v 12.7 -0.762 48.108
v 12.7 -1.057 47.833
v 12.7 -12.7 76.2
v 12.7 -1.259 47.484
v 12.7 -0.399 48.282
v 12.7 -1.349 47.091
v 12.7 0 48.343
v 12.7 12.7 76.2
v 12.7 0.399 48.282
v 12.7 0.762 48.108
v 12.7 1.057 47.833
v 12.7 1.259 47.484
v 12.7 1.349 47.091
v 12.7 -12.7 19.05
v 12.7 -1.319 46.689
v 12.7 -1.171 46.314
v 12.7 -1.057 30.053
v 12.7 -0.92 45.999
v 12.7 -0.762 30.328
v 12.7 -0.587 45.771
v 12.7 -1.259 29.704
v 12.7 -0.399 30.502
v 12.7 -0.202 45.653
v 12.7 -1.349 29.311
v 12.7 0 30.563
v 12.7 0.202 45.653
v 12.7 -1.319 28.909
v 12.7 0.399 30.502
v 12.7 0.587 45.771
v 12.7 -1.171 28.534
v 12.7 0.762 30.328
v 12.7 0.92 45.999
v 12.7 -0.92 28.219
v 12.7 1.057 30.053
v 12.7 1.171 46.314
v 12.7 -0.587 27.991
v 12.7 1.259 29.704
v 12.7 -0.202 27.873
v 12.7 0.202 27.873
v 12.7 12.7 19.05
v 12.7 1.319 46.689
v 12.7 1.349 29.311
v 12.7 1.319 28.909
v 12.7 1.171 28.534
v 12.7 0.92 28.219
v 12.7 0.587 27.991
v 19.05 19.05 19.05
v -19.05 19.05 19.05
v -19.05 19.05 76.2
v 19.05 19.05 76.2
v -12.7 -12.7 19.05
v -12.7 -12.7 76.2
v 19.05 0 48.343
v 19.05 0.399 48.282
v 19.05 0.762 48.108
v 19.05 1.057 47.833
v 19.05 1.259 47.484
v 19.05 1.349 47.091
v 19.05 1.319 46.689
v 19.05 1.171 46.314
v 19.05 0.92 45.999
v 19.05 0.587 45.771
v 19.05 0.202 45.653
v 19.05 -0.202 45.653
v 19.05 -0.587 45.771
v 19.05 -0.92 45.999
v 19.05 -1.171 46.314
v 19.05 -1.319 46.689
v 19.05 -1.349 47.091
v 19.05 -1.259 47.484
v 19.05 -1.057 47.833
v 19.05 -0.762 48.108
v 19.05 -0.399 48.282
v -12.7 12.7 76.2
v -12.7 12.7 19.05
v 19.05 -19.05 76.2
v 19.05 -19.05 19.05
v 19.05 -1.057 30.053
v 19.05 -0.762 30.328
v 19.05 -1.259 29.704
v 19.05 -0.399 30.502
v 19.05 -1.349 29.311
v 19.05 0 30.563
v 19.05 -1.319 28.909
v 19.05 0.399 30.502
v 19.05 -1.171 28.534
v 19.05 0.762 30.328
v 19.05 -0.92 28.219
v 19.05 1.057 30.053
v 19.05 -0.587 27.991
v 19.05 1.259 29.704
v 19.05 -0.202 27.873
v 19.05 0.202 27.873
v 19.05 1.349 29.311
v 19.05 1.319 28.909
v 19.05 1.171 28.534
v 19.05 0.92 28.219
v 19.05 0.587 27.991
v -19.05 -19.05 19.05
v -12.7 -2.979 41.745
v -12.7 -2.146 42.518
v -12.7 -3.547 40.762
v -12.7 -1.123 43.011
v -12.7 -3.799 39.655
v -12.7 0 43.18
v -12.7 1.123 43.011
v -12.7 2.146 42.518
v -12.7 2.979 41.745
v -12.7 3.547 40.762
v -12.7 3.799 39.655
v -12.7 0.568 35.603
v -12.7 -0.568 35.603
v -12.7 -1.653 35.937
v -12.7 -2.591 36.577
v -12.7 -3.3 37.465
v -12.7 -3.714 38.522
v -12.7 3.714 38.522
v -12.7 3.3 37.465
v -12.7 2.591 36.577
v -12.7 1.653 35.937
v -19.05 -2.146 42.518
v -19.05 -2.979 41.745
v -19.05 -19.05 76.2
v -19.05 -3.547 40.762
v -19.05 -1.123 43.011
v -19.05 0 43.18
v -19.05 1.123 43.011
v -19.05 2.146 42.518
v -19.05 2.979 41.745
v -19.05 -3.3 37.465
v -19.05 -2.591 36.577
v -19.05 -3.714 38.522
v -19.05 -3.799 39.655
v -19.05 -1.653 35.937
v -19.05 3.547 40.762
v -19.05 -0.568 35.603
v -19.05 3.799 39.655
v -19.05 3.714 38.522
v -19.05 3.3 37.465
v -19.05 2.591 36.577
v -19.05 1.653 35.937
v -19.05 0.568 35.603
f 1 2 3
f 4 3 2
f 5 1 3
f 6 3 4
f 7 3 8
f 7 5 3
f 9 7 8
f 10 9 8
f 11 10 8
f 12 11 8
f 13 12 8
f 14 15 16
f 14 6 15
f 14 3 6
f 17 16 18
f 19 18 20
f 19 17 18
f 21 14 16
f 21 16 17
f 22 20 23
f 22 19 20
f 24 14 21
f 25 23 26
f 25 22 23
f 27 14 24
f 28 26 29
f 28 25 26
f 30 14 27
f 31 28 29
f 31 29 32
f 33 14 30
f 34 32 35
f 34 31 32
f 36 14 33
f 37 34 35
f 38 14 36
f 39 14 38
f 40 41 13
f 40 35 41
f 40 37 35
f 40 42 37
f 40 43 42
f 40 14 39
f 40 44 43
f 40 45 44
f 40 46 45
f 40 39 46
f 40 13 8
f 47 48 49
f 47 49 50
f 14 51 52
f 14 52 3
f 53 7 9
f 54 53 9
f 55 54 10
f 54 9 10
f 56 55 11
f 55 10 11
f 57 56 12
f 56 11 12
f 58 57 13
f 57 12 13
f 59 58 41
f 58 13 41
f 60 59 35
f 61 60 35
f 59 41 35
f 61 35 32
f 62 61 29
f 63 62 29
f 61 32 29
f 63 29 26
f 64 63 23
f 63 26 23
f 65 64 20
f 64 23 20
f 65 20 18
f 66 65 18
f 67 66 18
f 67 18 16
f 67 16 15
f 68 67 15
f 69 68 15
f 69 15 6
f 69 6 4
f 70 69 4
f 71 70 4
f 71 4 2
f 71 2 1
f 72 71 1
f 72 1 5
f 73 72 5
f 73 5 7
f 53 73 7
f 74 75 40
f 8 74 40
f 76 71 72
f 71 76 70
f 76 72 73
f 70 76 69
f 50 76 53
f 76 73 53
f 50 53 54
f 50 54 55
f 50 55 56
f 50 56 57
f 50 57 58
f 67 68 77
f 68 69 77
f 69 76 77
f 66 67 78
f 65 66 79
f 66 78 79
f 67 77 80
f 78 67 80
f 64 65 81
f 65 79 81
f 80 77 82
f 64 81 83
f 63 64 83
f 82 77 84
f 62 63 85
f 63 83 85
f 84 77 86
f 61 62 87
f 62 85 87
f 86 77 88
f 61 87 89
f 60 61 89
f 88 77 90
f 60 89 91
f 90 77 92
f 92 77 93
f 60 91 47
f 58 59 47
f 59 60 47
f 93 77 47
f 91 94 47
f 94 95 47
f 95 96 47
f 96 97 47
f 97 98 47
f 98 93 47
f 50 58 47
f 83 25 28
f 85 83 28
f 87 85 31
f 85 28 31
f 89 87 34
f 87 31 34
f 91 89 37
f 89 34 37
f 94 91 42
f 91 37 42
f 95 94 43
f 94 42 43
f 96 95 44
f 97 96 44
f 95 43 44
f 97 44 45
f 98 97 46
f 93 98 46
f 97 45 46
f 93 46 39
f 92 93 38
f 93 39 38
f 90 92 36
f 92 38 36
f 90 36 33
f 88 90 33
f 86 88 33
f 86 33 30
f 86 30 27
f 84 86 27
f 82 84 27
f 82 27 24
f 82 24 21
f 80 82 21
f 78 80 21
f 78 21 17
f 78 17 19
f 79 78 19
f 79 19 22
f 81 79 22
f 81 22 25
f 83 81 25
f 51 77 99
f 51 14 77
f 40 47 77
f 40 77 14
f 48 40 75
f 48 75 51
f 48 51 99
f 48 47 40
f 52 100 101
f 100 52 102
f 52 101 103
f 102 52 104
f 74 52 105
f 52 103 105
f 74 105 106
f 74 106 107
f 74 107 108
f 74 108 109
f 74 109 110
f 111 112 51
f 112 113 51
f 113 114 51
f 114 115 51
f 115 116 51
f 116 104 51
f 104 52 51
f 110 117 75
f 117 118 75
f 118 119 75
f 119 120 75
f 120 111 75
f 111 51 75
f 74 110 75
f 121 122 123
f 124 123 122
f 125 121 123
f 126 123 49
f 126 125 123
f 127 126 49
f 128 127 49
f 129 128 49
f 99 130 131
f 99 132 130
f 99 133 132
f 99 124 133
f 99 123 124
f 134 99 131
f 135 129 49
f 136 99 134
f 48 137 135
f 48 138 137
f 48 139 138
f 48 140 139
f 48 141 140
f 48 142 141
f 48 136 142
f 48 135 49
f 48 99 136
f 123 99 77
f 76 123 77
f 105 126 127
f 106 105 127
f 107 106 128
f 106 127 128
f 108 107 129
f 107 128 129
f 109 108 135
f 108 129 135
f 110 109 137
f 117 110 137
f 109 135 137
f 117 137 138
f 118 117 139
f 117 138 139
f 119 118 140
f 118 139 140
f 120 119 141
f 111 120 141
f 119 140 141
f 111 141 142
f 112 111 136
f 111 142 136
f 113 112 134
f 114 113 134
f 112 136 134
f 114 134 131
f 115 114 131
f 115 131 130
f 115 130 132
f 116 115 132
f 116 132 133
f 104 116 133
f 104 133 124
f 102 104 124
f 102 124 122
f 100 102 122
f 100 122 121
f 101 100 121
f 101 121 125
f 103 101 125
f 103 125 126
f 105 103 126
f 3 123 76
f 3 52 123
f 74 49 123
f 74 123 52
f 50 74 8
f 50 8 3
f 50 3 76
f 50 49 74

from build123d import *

# Parameters (mm, degrees)
BOSS_EXTRUDE1_DEPTH       = 76.2
BOSS_EXTRUDE1_DEPTH_BACK  = 76.2
SKETCH3_W                 = 38.1
SKETCH3_H                 = 38.1
SKETCH3_W_2               = 25.4
SKETCH3_H_2               = 25.4
SKETCH4_W                 = 38.1
SKETCH4_H                 = 38.1
SKETCH4_W_2               = 25.4
SKETCH4_H_2               = 25.4
CUT_EXTRUDE1_DEPTH        = 95.25
CUT_EXTRUDE4_REACH        = 89.298
SKETCH7_R                 = 3.81
F_6_32_TAPPED_HOLE1_D     = 2.7051
F_6_32_TAPPED_HOLE1_DEPTH = 6.35


with BuildPart() as part:
    # Sketch3 → Boss-Extrude1 (new, two sides: drawn at the far end of the back side and taken through both)
    with BuildSketch(Plane.XY.offset(-BOSS_EXTRUDE1_DEPTH_BACK)):
        Rectangle(SKETCH3_W, SKETCH3_H)
        Rectangle(SKETCH3_W_2, SKETCH3_H_2, mode=Mode.SUBTRACT)
    extrude(amount=BOSS_EXTRUDE1_DEPTH + BOSS_EXTRUDE1_DEPTH_BACK)

    # Sketch4 → Cut-Extrude1 (cut)
    with BuildSketch(Plane(origin=(0, 0, -76.2), x_dir=(-1, 0, 0), z_dir=(0, 0, -1))):
        Rectangle(SKETCH4_W, SKETCH4_H)
        Rectangle(SKETCH4_W_2, SKETCH4_H_2, mode=Mode.SUBTRACT)
    extrude(amount=-CUT_EXTRUDE1_DEPTH, mode=Mode.SUBTRACT)

    # Sketch7 → Cut-Extrude4 (cut, up to next)
    with BuildSketch(Plane(origin=(-19.05, 0, 0), x_dir=(0, -1, 0), z_dir=(-1, 0, 0)), mode=Mode.PRIVATE) as cut_extrude4_sk1:
        with Locations(Location((0, 39.37, 0), (0, 0, 90))):
            Circle(SKETCH7_R)
    cut_extrude4_tool1 = extrude(cut_extrude4_sk1.sketch, amount=-CUT_EXTRUDE4_REACH, mode=Mode.PRIVATE) & part.part
    add(cut_extrude4_tool1.solids().sort_by_distance((-19.05, 0, 39.37))[0], mode=Mode.SUBTRACT)

    # #6-32 Tapped Hole1
    with Locations(Plane(origin=(19.05, 0, 0), x_dir=(0, 0, -1), z_dir=(1, 0, 0))):
        with Locations((-29.21, 0), (-46.99, 0)):
            Hole(F_6_32_TAPPED_HOLE1_D / 2, depth=F_6_32_TAPPED_HOLE1_DEPTH)


solid = part.part
